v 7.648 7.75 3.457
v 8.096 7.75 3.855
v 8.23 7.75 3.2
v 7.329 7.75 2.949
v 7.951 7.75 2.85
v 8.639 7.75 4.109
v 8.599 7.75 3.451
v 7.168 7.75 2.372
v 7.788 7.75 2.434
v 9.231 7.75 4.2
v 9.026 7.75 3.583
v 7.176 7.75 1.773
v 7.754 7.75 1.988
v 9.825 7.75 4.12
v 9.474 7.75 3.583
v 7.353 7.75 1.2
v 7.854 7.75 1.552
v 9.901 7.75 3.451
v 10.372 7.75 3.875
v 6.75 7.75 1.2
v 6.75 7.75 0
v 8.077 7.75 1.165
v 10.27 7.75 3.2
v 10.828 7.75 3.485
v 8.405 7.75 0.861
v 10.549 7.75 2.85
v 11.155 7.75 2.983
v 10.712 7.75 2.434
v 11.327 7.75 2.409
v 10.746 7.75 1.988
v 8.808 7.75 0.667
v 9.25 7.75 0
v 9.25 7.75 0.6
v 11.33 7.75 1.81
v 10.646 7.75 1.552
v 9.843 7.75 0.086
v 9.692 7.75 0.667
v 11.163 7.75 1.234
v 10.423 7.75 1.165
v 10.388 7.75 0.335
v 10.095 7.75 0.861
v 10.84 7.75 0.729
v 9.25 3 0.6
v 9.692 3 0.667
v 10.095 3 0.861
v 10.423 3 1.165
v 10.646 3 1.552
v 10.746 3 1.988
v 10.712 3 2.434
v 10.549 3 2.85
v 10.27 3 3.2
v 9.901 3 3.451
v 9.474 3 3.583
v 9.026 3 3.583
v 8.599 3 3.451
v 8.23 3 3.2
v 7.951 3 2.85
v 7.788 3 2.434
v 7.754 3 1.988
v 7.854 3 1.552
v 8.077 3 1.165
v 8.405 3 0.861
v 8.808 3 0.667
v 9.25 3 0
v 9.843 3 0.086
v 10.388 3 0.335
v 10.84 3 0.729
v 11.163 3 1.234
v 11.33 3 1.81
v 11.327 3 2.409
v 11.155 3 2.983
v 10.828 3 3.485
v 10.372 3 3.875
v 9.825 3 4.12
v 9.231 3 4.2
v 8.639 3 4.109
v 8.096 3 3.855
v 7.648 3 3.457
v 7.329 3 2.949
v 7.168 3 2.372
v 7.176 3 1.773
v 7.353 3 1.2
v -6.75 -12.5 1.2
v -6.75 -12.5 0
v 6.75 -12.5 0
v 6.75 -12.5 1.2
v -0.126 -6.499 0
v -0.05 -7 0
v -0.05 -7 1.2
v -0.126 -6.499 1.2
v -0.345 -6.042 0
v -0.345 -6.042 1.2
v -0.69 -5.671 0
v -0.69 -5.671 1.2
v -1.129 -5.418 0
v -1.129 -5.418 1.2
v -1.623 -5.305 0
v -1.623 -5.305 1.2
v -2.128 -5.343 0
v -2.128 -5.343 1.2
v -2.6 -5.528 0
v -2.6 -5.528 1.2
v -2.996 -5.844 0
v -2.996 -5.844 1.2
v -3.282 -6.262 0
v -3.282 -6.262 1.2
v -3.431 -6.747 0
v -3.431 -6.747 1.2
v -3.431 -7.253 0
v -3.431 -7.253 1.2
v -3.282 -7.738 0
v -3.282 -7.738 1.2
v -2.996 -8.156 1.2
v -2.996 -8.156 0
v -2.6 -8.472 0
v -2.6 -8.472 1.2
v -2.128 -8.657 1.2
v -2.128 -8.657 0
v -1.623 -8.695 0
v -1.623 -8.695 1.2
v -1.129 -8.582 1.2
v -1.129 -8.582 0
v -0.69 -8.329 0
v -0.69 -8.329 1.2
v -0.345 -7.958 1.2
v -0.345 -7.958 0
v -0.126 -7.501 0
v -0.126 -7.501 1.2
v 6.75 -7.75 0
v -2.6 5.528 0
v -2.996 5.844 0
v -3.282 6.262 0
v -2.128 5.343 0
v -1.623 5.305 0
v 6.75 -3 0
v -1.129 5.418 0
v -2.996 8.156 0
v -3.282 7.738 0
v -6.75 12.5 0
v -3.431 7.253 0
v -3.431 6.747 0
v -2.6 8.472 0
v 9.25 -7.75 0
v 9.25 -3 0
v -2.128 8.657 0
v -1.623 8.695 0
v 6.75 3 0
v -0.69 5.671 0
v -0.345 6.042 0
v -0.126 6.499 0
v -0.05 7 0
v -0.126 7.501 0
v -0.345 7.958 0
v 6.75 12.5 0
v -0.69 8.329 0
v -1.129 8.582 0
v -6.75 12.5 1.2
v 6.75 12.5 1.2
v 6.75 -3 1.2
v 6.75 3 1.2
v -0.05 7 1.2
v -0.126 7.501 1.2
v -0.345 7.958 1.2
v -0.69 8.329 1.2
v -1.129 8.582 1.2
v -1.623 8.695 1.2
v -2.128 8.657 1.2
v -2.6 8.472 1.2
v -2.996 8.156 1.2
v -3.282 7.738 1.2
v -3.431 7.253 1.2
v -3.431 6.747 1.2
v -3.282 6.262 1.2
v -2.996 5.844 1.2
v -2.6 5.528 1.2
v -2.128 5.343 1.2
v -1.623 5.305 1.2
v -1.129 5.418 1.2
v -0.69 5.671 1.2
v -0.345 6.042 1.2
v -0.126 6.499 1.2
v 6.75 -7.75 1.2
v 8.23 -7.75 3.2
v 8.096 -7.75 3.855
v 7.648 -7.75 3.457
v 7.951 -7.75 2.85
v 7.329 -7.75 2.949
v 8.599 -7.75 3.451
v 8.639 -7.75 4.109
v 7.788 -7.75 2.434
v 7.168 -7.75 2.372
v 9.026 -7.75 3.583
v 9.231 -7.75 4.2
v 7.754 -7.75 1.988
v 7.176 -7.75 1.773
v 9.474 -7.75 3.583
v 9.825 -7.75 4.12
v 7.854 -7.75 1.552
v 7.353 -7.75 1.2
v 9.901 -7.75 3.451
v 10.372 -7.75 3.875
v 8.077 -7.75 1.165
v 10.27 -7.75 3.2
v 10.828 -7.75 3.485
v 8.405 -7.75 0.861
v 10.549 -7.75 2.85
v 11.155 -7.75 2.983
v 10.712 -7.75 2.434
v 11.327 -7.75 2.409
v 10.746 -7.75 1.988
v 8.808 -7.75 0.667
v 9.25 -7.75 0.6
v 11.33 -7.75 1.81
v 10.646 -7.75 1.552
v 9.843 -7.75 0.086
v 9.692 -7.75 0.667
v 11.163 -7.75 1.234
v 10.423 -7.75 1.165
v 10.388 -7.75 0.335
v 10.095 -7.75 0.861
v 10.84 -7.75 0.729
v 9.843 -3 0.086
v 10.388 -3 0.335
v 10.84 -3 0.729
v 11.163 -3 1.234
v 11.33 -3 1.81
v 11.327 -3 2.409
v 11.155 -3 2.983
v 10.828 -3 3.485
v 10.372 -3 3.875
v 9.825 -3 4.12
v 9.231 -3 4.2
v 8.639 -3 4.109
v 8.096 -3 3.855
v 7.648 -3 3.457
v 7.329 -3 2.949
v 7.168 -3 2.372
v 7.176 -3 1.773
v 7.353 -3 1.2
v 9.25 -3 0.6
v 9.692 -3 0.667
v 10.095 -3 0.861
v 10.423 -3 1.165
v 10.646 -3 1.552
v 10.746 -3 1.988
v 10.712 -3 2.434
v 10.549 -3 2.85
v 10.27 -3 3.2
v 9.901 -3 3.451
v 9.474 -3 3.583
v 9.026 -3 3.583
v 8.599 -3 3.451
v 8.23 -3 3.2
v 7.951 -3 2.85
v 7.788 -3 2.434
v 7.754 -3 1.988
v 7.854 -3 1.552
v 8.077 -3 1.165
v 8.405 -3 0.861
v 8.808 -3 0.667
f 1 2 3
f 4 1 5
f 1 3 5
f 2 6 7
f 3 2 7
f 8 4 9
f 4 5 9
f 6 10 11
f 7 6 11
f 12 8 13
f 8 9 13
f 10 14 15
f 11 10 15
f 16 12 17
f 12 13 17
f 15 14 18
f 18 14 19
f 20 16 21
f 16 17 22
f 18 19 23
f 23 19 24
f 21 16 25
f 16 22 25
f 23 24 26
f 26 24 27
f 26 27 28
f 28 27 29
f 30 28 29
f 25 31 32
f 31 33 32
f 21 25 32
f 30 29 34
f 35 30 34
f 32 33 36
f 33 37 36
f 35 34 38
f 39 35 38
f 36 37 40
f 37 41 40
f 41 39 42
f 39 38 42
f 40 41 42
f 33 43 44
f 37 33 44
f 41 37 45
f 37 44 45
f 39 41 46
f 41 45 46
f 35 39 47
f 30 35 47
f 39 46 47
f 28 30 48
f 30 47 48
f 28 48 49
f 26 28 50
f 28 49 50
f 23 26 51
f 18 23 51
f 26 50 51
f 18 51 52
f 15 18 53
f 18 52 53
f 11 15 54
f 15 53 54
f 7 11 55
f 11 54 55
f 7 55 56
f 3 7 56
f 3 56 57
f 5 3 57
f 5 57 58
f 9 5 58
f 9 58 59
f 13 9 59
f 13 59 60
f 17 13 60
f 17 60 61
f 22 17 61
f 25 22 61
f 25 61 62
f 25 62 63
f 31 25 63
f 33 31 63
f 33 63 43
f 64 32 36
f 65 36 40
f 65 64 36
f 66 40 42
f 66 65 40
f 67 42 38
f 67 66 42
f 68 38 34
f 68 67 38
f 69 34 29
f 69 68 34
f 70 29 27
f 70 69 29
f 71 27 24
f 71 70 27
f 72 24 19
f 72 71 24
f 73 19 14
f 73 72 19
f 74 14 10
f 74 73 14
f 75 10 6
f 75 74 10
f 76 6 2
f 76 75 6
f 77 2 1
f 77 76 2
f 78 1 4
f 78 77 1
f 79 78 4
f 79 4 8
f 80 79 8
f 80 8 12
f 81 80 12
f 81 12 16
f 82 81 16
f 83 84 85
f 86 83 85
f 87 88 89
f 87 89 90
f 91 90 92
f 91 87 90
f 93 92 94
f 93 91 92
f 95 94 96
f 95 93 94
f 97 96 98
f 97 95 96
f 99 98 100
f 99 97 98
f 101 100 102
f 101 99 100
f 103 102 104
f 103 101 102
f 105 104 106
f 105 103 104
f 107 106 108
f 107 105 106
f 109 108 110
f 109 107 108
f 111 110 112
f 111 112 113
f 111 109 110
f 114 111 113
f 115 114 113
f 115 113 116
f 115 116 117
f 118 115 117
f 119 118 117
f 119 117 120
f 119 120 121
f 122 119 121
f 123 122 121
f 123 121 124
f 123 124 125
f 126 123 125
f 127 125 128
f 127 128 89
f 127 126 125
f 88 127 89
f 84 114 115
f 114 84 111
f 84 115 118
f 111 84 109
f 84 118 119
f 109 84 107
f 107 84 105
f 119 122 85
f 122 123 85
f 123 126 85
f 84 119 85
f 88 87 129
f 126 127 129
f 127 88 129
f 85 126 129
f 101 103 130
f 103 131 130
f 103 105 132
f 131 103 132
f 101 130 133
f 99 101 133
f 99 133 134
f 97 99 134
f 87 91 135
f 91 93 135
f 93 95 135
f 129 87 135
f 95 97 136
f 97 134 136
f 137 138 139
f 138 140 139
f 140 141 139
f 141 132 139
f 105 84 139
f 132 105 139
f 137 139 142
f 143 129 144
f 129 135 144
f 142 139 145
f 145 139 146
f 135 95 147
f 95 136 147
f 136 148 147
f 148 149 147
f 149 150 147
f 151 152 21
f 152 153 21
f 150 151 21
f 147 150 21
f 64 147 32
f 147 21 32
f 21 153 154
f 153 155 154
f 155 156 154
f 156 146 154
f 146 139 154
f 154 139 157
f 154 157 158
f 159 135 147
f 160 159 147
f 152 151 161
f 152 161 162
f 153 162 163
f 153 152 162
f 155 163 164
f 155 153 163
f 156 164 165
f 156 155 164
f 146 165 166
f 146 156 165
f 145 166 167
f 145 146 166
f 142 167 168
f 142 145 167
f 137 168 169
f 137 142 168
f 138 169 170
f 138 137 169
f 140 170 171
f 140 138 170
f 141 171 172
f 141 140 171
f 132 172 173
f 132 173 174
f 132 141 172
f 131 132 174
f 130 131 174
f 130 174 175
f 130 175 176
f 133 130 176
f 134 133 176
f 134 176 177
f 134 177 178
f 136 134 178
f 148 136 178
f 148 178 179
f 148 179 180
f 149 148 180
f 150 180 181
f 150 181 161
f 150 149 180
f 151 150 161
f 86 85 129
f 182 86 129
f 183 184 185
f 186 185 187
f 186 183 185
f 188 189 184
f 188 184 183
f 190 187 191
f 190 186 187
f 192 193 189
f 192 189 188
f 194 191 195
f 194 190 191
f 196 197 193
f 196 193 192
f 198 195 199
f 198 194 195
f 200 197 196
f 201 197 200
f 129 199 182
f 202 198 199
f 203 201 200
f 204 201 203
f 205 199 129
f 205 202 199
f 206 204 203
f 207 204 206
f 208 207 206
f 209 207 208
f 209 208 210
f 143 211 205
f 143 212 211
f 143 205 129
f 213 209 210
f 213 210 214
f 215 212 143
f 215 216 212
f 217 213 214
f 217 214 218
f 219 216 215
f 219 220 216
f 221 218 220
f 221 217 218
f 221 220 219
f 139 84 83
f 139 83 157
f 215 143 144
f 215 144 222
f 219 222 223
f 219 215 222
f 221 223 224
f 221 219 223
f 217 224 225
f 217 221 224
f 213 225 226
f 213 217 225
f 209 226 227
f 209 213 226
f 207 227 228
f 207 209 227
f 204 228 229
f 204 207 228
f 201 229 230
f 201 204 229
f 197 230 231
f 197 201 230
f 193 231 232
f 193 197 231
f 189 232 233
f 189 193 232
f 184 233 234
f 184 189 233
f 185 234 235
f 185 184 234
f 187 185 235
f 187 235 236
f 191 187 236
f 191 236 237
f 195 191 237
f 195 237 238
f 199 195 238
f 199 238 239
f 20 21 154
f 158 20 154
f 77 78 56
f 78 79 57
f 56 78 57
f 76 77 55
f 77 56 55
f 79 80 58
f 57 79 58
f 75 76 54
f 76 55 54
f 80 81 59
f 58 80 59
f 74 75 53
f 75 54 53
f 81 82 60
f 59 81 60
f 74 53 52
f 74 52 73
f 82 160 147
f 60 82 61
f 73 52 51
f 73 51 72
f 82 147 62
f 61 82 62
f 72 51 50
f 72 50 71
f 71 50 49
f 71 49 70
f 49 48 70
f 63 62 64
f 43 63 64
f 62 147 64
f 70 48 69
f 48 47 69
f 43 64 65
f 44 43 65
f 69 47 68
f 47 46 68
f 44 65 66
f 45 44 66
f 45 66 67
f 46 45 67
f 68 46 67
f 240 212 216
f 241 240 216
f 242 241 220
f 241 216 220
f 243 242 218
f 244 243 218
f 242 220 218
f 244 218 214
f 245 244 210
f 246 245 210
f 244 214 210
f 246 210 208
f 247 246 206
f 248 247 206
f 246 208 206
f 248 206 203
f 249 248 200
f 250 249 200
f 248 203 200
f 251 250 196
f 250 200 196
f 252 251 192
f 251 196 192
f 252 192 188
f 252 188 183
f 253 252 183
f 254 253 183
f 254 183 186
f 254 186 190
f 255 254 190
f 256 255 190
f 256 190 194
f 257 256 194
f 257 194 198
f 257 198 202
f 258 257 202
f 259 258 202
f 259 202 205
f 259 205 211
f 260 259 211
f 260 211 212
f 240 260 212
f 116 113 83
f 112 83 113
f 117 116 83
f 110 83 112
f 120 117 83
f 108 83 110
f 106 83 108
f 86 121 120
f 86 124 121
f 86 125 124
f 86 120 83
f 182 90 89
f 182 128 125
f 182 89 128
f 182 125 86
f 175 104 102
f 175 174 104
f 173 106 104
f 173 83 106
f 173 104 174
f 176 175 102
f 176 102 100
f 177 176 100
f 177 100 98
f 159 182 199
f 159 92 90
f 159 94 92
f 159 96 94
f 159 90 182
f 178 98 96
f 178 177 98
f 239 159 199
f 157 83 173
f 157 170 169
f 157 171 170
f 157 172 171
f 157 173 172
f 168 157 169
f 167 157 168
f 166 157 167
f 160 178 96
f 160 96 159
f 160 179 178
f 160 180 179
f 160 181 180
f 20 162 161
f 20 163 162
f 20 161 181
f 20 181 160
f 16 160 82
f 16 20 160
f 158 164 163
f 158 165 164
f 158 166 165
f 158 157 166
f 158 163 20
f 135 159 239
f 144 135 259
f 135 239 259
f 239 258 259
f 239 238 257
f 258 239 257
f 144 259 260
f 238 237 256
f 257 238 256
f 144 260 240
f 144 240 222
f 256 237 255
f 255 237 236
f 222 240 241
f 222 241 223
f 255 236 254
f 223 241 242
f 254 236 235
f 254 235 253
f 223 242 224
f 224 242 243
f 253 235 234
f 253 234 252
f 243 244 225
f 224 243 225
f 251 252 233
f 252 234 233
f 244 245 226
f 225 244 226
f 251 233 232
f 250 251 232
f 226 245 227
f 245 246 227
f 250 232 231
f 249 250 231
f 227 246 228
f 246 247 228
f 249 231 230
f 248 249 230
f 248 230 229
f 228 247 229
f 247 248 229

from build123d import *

# Parameters (mm, degrees)
SKETCH_1_W          = 13.5
SKETCH_1_H          = 25
SKETCH_1_R          = 1.7
SKETCH_1_W_2        = 2.5
SKETCH_1_H_2        = 4.75
EXTRUDE_1_DEPTH     = 1.2
SKETCH_2_R          = 2.1
EXTRUDE_2_DEPTH     = 15.5
SKETCH_3_R          = 1.5
CUT_EXTRUDE_1_DEPTH = 18
SKETCH_4_W          = 4.6
SKETCH_4_H          = 6
CUT_EXTRUDE_2_DEPTH = 5


with BuildPart() as part:
    # 草图1 → 凸台-拉伸1 (new body)
    # profile 1 of 3: a face of its own
    with BuildSketch(Plane.XY):
        Rectangle(SKETCH_1_W, SKETCH_1_H)
        with Locations((-1.75, -7)):
            Circle(SKETCH_1_R, mode=Mode.SUBTRACT)
        with Locations((-1.75, 7)):
            Circle(SKETCH_1_R, mode=Mode.SUBTRACT)
    # profile 2 of 3: a face of its own
    with BuildSketch(Plane.XY):
        with Locations((8, 5.375)):
            Rectangle(SKETCH_1_W_2, SKETCH_1_H_2)
    # profile 3 of 3: a face of its own
    with BuildSketch(Plane.XY):
        with Locations((8, -5.375)):
            Rectangle(SKETCH_1_W_2, SKETCH_1_H_2)
    extrude(amount=EXTRUDE_1_DEPTH)

    # 草图2 → 凸台-拉伸2 (add)
    with BuildSketch(Plane.XZ.offset(7.75)):
        with Locations(Location((9.25, 2.1, 0), (0, 0, 270))):
            Circle(SKETCH_2_R)
    extrude(amount=-EXTRUDE_2_DEPTH)

    # 草图3 → 切除-拉伸1 (cut)
    with BuildSketch(Plane.XZ.offset(7.75)):
        with Locations(Location((9.25, 2.1, 0), (0, 0, 270))):
            Circle(SKETCH_3_R)
    extrude(amount=-CUT_EXTRUDE_1_DEPTH, mode=Mode.SUBTRACT)

    # 草图4 → 切除-拉伸2 (cut, symmetric)
    with BuildSketch(Plane.XY.offset(1.2)):
        with Locations((9.05, 0)):
            Rectangle(SKETCH_4_W, SKETCH_4_H)
    extrude(amount=CUT_EXTRUDE_2_DEPTH, both=True, mode=Mode.SUBTRACT)


solid = part.part
